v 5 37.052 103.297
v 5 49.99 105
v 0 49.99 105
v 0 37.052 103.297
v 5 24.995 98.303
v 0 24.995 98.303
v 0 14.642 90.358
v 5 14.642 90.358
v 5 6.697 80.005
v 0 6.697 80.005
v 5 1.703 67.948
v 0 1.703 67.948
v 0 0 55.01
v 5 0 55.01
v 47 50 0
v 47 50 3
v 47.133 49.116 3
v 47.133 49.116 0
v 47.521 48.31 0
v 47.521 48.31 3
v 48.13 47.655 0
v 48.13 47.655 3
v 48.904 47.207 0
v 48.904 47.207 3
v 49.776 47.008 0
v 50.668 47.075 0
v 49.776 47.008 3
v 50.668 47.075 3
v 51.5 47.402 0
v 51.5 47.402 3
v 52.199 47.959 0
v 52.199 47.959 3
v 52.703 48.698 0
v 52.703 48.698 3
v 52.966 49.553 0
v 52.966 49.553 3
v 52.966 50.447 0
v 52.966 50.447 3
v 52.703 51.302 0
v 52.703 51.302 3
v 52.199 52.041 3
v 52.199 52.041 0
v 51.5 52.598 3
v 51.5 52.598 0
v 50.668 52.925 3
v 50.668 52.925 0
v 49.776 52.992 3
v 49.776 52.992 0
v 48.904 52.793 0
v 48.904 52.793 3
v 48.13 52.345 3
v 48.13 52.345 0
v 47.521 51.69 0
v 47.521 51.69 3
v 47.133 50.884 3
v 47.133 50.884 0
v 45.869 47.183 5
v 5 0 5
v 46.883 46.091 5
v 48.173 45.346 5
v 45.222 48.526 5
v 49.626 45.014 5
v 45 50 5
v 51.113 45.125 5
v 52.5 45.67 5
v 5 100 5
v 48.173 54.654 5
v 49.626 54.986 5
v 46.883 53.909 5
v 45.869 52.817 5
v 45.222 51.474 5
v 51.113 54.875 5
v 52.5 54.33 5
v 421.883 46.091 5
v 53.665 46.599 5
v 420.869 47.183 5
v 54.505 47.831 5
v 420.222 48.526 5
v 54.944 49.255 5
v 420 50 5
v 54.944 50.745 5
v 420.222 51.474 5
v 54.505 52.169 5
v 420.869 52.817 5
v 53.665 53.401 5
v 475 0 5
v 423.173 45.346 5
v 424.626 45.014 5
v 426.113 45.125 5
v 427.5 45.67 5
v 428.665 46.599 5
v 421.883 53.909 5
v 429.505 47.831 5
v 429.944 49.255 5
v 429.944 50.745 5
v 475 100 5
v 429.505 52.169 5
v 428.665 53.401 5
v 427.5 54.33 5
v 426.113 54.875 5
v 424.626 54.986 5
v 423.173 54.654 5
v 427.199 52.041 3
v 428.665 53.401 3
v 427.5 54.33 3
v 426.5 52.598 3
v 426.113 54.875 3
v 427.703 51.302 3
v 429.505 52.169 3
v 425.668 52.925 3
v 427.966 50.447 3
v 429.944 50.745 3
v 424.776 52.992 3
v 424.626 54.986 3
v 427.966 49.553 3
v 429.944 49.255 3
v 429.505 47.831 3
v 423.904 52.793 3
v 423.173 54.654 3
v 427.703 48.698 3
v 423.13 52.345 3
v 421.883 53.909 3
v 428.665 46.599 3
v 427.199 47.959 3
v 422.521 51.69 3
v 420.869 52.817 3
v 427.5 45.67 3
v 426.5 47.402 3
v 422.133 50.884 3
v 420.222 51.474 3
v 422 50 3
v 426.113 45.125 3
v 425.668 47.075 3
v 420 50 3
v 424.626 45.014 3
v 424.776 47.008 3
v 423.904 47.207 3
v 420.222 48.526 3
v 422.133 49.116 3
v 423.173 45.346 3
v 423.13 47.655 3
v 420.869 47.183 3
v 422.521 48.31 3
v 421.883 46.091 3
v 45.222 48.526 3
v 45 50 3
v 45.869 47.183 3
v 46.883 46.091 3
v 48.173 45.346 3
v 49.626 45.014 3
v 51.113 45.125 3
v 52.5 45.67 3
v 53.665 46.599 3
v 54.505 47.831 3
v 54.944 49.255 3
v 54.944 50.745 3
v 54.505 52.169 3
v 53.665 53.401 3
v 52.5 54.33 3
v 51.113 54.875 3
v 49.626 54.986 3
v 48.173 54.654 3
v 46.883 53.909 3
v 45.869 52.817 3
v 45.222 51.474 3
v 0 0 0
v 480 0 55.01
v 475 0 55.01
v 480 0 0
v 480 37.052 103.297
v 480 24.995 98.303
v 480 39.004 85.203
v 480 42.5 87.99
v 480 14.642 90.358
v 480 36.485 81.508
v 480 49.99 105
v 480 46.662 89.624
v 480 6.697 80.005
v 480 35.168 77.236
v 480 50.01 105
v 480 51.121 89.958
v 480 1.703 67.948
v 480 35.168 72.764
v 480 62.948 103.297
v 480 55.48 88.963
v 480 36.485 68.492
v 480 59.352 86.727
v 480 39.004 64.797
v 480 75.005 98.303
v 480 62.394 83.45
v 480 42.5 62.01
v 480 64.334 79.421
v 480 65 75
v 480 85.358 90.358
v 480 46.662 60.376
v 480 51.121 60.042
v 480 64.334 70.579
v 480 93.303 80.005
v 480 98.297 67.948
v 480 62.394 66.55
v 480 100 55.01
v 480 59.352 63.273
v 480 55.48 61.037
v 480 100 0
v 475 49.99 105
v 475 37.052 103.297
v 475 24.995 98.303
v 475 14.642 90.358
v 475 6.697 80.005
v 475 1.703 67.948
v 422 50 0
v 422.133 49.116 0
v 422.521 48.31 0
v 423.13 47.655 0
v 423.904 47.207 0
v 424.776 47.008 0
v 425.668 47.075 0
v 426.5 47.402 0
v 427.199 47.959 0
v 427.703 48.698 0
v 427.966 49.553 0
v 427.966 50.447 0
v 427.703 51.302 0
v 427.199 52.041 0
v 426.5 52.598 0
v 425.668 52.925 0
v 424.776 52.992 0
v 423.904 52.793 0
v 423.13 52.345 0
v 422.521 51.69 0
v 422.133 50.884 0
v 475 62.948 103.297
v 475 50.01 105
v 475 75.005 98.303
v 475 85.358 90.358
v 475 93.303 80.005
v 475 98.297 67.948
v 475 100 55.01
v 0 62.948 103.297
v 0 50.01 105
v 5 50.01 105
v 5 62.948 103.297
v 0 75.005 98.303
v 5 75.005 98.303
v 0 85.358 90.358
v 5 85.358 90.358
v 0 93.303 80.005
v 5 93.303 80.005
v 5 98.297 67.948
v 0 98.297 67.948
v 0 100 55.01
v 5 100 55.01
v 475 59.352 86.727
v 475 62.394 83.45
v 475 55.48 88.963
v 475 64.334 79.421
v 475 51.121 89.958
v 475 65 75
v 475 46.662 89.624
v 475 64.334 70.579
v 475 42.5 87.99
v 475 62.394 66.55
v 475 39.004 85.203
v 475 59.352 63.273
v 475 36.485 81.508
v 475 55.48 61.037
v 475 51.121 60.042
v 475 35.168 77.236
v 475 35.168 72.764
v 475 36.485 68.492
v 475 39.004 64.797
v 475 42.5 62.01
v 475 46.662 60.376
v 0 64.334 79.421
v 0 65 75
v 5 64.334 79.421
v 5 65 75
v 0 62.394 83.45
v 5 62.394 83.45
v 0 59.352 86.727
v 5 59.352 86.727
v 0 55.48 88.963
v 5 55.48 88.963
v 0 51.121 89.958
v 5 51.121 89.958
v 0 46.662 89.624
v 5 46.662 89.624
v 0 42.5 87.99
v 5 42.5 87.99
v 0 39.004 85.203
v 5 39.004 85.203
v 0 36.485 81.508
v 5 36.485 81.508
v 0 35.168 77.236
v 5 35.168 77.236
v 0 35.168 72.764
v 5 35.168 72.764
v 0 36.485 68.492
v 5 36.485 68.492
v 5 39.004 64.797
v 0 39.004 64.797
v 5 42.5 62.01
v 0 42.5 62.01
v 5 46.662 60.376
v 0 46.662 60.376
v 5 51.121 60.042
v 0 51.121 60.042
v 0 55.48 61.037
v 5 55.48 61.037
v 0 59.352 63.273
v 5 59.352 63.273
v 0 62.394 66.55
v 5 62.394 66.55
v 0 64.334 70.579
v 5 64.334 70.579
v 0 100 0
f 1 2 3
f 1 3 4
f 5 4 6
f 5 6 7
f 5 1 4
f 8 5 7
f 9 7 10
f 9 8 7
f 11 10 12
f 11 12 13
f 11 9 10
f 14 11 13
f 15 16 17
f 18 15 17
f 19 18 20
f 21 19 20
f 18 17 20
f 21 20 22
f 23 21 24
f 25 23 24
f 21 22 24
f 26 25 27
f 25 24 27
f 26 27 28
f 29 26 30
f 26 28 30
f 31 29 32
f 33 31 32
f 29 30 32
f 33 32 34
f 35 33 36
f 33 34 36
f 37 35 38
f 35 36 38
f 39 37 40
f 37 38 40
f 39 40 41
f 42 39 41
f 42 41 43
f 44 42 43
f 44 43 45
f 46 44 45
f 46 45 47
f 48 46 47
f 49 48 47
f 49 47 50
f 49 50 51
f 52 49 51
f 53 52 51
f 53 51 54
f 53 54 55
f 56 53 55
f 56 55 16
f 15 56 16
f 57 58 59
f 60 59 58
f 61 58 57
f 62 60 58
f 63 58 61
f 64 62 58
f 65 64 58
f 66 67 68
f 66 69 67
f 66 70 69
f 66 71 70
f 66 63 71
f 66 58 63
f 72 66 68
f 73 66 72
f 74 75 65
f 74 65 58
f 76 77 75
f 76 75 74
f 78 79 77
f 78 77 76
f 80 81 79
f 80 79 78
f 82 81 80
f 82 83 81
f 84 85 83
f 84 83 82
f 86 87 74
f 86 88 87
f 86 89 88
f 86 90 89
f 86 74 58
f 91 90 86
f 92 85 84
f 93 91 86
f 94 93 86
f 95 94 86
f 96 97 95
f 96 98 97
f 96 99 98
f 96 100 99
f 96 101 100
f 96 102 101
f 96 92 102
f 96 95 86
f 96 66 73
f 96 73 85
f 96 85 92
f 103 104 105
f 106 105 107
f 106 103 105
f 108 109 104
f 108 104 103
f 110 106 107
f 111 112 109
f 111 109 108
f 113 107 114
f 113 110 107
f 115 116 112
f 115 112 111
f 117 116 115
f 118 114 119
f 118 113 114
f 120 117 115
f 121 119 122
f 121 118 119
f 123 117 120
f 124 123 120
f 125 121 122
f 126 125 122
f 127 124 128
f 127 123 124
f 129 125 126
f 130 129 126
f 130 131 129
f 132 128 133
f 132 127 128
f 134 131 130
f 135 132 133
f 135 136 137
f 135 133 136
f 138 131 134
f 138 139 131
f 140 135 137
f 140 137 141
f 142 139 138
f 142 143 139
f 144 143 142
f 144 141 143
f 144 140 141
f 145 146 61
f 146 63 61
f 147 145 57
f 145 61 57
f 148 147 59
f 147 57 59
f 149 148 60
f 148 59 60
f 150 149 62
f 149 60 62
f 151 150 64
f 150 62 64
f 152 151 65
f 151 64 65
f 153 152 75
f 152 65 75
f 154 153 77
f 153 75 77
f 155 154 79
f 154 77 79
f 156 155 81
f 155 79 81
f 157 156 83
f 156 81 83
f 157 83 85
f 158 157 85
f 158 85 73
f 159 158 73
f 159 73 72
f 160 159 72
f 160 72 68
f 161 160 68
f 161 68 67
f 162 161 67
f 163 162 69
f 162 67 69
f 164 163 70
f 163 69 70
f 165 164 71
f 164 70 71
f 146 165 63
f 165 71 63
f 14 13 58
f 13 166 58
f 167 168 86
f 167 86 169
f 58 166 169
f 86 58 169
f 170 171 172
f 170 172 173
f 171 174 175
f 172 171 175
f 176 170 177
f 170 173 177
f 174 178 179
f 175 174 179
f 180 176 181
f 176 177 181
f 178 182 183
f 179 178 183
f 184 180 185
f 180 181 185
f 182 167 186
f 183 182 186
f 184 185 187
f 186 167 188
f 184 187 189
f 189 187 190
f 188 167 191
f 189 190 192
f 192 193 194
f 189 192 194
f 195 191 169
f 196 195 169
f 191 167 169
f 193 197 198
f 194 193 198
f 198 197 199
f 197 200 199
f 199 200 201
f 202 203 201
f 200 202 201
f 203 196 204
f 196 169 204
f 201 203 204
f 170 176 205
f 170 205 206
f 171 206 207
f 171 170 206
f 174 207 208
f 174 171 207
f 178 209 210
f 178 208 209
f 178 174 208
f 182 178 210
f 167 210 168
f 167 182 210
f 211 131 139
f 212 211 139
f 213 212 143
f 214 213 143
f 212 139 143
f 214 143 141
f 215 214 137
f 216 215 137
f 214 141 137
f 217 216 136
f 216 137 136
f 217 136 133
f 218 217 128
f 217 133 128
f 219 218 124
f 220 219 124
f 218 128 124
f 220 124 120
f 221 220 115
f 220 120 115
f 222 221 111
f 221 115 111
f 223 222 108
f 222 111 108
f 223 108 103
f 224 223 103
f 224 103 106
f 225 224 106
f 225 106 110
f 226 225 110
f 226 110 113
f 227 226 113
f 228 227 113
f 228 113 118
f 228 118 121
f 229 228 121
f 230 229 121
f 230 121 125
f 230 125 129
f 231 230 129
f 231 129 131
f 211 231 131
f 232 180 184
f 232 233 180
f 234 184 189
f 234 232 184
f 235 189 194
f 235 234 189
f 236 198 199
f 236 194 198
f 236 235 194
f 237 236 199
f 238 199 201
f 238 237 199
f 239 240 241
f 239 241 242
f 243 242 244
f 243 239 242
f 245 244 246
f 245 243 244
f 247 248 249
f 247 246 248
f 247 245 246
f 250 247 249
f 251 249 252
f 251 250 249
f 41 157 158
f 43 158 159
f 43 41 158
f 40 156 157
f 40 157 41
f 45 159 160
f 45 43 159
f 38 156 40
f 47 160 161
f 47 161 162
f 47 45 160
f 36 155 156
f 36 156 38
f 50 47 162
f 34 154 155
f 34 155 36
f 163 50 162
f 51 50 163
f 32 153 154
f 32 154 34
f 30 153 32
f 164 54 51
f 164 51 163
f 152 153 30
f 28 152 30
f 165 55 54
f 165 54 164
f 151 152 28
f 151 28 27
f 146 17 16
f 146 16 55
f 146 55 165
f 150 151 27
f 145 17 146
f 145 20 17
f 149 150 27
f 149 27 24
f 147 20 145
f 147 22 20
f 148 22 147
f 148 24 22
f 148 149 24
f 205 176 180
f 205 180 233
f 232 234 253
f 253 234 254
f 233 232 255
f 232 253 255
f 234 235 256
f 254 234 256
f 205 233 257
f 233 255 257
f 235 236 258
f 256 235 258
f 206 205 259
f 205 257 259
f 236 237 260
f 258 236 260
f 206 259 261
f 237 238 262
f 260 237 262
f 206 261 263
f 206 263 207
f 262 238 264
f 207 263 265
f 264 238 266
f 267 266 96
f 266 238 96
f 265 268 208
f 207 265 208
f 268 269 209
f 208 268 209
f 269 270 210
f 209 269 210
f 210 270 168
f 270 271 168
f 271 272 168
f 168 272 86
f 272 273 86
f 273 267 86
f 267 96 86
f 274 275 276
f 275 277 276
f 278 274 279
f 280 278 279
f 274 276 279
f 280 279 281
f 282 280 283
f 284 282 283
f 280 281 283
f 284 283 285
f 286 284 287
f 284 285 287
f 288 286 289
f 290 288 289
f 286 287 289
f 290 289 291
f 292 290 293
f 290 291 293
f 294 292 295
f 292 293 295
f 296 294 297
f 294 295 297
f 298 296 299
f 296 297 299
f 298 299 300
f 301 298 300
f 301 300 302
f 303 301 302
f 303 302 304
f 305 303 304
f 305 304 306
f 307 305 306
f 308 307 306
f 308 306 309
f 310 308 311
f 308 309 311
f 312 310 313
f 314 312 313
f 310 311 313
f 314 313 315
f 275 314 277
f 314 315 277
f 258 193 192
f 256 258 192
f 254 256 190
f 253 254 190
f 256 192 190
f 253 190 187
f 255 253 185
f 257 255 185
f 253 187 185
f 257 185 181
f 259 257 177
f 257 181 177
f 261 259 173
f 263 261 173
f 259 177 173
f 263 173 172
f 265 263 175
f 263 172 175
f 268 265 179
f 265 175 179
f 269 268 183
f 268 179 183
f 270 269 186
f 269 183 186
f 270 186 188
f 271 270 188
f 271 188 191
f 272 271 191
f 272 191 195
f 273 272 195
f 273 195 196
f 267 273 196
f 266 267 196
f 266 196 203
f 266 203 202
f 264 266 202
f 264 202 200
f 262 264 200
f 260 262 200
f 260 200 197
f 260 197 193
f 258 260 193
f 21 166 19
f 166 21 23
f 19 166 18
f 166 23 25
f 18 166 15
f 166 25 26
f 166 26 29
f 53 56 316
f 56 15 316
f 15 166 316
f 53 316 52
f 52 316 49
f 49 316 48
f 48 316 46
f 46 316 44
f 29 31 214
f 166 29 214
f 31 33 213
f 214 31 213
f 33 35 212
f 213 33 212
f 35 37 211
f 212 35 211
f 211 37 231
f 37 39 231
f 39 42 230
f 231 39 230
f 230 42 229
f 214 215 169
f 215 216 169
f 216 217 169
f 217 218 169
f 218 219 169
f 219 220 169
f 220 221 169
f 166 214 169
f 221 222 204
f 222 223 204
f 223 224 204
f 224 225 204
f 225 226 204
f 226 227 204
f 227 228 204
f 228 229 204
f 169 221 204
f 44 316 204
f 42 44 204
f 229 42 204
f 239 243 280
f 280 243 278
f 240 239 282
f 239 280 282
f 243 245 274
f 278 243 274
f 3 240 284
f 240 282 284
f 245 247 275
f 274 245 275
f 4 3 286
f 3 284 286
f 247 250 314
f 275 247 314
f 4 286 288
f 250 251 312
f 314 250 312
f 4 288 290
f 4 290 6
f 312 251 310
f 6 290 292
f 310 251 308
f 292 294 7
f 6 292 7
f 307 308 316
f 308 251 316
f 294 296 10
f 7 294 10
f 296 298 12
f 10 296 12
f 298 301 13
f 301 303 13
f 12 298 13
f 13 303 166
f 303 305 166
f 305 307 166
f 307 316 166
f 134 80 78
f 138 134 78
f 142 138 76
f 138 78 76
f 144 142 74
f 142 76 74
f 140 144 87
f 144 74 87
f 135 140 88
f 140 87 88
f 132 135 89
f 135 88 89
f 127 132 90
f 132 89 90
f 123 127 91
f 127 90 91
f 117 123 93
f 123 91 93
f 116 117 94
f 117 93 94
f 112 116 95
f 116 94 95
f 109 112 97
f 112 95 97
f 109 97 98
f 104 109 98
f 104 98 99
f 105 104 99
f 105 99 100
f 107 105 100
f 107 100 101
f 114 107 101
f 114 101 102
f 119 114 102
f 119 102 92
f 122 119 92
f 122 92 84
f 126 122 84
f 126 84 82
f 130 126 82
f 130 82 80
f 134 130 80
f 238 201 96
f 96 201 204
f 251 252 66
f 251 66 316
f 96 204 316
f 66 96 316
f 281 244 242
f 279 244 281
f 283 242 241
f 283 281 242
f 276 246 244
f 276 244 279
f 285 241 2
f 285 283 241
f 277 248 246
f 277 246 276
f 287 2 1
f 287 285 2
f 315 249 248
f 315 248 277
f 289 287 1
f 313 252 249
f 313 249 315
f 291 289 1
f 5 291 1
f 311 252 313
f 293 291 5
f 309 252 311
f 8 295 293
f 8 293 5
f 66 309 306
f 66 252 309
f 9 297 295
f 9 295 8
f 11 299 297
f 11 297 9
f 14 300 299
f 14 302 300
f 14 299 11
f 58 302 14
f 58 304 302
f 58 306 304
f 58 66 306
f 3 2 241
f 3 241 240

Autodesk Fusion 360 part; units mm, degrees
sketch "Sketch1" plane through (0, 0, 0) normal (0, 0, 1) x (1, 0, 0)
  line L0 (0, 0) -> (480, 0)
  line L1 (480, 0) -> (480, 100)
  line L2 (480, 100) -> (0, 100)
  line L3 (0, 100) -> (0, 0)
  dimension "d1" = 480
  dimension "d2" = 100
extrude "Extrude1" add sketch "Sketch1" along normal blind 5
sketch "Sketch2" plane through (0, 0, 5) normal (0, 0, 1) x (-1, 0, 0)
  line L0 (0, -100) -> (0, 0)
  line L1 (0, 0) -> (-480, 0)
  line L2 (-480, 0) -> (-480, -100)
  line L3 (-480, -100) -> (0, -100)
  line L4 (0, -100) -> (-5, -100)
  line L5 (-5, -100) -> (-5, 0)
  line L6 (-5, 0) -> (0, 0)
  line L7 (0, 0) -> (0, -100)
  line L8 (-480, -100) -> (-475, -100)
  line L9 (-475, -100) -> (-475, 0)
  line L10 (-475, 0) -> (-480, 0)
  line L11 (-480, 0) -> (-480, -100)
  dimension "d5" = 5
  dimension "d6" = 100
  dimension "d7" = 5
  dimension "d8" = 100
extrude "Extrude2" add sketch "Sketch2" along normal blind 100 contours L0 L1 L3 L4 L5 L6 L7 | L1 L2 L3 L8 L9 L10 L11
sketch "Sketch3" plane through (480, 0, 0) normal (1, 0, 0) x (0, 1, 0)
  line L0 (0, 0) -> (100, 0)
  line L1 (100, 0) -> (100, 105)
  line L2 (100, 105) -> (0, 105)
  line L3 (0, 105) -> (0, 0)
  circle A0 centre (50, 75) radius 15
  dimension "d11" = 30
extrude "Extrude3" cut sketch "Sketch3" against normal blind 500 contours A0
sketch "Sketch4" plane through (0, 0, 5) normal (0, 0, 1) x (-1, 0, 0)
  line L0 (-5, -100) -> (-5, 0)
  line L1 (-5, 0) -> (-475, 0)
  line L2 (-475, 0) -> (-475, -100)
  line L3 (-475, -100) -> (-5, -100)
  circle A0 centre (-50, -50) radius 5
  circle A1 centre (-425, -50) radius 5
  dimension "d14" = 10
  dimension "d15" = 10
extrude "Extrude4" cut sketch "Sketch4" against normal blind 2 contours A0 | A1
sketch "Sketch5" plane through (0, 0, 5) normal (0, 0, 1) x (-1, 0, 0)
  circle A0 centre (-425, -50) radius 5
  circle A1 centre (-50, -50) radius 5
  line L0 (-5, -100) -> (-5, 0)
  line L1 (-5, 0) -> (-475, 0)
  line L2 (-475, 0) -> (-475, -100)
  line L3 (-475, -100) -> (-5, -100)
  circle A2 centre (-50, -50) radius 3
  circle A3 centre (-425, -50) radius 3
  dimension "d18" = 6
  dimension "d19" = 6
extrude "Extrude5" cut sketch "Sketch5" against normal blind 6 contours A2 | A3
fillet "Fillet1" radius 50 4 edges at (477.5, 0, 105) (477.5, 100, 105) (2.5, 100, 105) (2.5, 0, 105)
